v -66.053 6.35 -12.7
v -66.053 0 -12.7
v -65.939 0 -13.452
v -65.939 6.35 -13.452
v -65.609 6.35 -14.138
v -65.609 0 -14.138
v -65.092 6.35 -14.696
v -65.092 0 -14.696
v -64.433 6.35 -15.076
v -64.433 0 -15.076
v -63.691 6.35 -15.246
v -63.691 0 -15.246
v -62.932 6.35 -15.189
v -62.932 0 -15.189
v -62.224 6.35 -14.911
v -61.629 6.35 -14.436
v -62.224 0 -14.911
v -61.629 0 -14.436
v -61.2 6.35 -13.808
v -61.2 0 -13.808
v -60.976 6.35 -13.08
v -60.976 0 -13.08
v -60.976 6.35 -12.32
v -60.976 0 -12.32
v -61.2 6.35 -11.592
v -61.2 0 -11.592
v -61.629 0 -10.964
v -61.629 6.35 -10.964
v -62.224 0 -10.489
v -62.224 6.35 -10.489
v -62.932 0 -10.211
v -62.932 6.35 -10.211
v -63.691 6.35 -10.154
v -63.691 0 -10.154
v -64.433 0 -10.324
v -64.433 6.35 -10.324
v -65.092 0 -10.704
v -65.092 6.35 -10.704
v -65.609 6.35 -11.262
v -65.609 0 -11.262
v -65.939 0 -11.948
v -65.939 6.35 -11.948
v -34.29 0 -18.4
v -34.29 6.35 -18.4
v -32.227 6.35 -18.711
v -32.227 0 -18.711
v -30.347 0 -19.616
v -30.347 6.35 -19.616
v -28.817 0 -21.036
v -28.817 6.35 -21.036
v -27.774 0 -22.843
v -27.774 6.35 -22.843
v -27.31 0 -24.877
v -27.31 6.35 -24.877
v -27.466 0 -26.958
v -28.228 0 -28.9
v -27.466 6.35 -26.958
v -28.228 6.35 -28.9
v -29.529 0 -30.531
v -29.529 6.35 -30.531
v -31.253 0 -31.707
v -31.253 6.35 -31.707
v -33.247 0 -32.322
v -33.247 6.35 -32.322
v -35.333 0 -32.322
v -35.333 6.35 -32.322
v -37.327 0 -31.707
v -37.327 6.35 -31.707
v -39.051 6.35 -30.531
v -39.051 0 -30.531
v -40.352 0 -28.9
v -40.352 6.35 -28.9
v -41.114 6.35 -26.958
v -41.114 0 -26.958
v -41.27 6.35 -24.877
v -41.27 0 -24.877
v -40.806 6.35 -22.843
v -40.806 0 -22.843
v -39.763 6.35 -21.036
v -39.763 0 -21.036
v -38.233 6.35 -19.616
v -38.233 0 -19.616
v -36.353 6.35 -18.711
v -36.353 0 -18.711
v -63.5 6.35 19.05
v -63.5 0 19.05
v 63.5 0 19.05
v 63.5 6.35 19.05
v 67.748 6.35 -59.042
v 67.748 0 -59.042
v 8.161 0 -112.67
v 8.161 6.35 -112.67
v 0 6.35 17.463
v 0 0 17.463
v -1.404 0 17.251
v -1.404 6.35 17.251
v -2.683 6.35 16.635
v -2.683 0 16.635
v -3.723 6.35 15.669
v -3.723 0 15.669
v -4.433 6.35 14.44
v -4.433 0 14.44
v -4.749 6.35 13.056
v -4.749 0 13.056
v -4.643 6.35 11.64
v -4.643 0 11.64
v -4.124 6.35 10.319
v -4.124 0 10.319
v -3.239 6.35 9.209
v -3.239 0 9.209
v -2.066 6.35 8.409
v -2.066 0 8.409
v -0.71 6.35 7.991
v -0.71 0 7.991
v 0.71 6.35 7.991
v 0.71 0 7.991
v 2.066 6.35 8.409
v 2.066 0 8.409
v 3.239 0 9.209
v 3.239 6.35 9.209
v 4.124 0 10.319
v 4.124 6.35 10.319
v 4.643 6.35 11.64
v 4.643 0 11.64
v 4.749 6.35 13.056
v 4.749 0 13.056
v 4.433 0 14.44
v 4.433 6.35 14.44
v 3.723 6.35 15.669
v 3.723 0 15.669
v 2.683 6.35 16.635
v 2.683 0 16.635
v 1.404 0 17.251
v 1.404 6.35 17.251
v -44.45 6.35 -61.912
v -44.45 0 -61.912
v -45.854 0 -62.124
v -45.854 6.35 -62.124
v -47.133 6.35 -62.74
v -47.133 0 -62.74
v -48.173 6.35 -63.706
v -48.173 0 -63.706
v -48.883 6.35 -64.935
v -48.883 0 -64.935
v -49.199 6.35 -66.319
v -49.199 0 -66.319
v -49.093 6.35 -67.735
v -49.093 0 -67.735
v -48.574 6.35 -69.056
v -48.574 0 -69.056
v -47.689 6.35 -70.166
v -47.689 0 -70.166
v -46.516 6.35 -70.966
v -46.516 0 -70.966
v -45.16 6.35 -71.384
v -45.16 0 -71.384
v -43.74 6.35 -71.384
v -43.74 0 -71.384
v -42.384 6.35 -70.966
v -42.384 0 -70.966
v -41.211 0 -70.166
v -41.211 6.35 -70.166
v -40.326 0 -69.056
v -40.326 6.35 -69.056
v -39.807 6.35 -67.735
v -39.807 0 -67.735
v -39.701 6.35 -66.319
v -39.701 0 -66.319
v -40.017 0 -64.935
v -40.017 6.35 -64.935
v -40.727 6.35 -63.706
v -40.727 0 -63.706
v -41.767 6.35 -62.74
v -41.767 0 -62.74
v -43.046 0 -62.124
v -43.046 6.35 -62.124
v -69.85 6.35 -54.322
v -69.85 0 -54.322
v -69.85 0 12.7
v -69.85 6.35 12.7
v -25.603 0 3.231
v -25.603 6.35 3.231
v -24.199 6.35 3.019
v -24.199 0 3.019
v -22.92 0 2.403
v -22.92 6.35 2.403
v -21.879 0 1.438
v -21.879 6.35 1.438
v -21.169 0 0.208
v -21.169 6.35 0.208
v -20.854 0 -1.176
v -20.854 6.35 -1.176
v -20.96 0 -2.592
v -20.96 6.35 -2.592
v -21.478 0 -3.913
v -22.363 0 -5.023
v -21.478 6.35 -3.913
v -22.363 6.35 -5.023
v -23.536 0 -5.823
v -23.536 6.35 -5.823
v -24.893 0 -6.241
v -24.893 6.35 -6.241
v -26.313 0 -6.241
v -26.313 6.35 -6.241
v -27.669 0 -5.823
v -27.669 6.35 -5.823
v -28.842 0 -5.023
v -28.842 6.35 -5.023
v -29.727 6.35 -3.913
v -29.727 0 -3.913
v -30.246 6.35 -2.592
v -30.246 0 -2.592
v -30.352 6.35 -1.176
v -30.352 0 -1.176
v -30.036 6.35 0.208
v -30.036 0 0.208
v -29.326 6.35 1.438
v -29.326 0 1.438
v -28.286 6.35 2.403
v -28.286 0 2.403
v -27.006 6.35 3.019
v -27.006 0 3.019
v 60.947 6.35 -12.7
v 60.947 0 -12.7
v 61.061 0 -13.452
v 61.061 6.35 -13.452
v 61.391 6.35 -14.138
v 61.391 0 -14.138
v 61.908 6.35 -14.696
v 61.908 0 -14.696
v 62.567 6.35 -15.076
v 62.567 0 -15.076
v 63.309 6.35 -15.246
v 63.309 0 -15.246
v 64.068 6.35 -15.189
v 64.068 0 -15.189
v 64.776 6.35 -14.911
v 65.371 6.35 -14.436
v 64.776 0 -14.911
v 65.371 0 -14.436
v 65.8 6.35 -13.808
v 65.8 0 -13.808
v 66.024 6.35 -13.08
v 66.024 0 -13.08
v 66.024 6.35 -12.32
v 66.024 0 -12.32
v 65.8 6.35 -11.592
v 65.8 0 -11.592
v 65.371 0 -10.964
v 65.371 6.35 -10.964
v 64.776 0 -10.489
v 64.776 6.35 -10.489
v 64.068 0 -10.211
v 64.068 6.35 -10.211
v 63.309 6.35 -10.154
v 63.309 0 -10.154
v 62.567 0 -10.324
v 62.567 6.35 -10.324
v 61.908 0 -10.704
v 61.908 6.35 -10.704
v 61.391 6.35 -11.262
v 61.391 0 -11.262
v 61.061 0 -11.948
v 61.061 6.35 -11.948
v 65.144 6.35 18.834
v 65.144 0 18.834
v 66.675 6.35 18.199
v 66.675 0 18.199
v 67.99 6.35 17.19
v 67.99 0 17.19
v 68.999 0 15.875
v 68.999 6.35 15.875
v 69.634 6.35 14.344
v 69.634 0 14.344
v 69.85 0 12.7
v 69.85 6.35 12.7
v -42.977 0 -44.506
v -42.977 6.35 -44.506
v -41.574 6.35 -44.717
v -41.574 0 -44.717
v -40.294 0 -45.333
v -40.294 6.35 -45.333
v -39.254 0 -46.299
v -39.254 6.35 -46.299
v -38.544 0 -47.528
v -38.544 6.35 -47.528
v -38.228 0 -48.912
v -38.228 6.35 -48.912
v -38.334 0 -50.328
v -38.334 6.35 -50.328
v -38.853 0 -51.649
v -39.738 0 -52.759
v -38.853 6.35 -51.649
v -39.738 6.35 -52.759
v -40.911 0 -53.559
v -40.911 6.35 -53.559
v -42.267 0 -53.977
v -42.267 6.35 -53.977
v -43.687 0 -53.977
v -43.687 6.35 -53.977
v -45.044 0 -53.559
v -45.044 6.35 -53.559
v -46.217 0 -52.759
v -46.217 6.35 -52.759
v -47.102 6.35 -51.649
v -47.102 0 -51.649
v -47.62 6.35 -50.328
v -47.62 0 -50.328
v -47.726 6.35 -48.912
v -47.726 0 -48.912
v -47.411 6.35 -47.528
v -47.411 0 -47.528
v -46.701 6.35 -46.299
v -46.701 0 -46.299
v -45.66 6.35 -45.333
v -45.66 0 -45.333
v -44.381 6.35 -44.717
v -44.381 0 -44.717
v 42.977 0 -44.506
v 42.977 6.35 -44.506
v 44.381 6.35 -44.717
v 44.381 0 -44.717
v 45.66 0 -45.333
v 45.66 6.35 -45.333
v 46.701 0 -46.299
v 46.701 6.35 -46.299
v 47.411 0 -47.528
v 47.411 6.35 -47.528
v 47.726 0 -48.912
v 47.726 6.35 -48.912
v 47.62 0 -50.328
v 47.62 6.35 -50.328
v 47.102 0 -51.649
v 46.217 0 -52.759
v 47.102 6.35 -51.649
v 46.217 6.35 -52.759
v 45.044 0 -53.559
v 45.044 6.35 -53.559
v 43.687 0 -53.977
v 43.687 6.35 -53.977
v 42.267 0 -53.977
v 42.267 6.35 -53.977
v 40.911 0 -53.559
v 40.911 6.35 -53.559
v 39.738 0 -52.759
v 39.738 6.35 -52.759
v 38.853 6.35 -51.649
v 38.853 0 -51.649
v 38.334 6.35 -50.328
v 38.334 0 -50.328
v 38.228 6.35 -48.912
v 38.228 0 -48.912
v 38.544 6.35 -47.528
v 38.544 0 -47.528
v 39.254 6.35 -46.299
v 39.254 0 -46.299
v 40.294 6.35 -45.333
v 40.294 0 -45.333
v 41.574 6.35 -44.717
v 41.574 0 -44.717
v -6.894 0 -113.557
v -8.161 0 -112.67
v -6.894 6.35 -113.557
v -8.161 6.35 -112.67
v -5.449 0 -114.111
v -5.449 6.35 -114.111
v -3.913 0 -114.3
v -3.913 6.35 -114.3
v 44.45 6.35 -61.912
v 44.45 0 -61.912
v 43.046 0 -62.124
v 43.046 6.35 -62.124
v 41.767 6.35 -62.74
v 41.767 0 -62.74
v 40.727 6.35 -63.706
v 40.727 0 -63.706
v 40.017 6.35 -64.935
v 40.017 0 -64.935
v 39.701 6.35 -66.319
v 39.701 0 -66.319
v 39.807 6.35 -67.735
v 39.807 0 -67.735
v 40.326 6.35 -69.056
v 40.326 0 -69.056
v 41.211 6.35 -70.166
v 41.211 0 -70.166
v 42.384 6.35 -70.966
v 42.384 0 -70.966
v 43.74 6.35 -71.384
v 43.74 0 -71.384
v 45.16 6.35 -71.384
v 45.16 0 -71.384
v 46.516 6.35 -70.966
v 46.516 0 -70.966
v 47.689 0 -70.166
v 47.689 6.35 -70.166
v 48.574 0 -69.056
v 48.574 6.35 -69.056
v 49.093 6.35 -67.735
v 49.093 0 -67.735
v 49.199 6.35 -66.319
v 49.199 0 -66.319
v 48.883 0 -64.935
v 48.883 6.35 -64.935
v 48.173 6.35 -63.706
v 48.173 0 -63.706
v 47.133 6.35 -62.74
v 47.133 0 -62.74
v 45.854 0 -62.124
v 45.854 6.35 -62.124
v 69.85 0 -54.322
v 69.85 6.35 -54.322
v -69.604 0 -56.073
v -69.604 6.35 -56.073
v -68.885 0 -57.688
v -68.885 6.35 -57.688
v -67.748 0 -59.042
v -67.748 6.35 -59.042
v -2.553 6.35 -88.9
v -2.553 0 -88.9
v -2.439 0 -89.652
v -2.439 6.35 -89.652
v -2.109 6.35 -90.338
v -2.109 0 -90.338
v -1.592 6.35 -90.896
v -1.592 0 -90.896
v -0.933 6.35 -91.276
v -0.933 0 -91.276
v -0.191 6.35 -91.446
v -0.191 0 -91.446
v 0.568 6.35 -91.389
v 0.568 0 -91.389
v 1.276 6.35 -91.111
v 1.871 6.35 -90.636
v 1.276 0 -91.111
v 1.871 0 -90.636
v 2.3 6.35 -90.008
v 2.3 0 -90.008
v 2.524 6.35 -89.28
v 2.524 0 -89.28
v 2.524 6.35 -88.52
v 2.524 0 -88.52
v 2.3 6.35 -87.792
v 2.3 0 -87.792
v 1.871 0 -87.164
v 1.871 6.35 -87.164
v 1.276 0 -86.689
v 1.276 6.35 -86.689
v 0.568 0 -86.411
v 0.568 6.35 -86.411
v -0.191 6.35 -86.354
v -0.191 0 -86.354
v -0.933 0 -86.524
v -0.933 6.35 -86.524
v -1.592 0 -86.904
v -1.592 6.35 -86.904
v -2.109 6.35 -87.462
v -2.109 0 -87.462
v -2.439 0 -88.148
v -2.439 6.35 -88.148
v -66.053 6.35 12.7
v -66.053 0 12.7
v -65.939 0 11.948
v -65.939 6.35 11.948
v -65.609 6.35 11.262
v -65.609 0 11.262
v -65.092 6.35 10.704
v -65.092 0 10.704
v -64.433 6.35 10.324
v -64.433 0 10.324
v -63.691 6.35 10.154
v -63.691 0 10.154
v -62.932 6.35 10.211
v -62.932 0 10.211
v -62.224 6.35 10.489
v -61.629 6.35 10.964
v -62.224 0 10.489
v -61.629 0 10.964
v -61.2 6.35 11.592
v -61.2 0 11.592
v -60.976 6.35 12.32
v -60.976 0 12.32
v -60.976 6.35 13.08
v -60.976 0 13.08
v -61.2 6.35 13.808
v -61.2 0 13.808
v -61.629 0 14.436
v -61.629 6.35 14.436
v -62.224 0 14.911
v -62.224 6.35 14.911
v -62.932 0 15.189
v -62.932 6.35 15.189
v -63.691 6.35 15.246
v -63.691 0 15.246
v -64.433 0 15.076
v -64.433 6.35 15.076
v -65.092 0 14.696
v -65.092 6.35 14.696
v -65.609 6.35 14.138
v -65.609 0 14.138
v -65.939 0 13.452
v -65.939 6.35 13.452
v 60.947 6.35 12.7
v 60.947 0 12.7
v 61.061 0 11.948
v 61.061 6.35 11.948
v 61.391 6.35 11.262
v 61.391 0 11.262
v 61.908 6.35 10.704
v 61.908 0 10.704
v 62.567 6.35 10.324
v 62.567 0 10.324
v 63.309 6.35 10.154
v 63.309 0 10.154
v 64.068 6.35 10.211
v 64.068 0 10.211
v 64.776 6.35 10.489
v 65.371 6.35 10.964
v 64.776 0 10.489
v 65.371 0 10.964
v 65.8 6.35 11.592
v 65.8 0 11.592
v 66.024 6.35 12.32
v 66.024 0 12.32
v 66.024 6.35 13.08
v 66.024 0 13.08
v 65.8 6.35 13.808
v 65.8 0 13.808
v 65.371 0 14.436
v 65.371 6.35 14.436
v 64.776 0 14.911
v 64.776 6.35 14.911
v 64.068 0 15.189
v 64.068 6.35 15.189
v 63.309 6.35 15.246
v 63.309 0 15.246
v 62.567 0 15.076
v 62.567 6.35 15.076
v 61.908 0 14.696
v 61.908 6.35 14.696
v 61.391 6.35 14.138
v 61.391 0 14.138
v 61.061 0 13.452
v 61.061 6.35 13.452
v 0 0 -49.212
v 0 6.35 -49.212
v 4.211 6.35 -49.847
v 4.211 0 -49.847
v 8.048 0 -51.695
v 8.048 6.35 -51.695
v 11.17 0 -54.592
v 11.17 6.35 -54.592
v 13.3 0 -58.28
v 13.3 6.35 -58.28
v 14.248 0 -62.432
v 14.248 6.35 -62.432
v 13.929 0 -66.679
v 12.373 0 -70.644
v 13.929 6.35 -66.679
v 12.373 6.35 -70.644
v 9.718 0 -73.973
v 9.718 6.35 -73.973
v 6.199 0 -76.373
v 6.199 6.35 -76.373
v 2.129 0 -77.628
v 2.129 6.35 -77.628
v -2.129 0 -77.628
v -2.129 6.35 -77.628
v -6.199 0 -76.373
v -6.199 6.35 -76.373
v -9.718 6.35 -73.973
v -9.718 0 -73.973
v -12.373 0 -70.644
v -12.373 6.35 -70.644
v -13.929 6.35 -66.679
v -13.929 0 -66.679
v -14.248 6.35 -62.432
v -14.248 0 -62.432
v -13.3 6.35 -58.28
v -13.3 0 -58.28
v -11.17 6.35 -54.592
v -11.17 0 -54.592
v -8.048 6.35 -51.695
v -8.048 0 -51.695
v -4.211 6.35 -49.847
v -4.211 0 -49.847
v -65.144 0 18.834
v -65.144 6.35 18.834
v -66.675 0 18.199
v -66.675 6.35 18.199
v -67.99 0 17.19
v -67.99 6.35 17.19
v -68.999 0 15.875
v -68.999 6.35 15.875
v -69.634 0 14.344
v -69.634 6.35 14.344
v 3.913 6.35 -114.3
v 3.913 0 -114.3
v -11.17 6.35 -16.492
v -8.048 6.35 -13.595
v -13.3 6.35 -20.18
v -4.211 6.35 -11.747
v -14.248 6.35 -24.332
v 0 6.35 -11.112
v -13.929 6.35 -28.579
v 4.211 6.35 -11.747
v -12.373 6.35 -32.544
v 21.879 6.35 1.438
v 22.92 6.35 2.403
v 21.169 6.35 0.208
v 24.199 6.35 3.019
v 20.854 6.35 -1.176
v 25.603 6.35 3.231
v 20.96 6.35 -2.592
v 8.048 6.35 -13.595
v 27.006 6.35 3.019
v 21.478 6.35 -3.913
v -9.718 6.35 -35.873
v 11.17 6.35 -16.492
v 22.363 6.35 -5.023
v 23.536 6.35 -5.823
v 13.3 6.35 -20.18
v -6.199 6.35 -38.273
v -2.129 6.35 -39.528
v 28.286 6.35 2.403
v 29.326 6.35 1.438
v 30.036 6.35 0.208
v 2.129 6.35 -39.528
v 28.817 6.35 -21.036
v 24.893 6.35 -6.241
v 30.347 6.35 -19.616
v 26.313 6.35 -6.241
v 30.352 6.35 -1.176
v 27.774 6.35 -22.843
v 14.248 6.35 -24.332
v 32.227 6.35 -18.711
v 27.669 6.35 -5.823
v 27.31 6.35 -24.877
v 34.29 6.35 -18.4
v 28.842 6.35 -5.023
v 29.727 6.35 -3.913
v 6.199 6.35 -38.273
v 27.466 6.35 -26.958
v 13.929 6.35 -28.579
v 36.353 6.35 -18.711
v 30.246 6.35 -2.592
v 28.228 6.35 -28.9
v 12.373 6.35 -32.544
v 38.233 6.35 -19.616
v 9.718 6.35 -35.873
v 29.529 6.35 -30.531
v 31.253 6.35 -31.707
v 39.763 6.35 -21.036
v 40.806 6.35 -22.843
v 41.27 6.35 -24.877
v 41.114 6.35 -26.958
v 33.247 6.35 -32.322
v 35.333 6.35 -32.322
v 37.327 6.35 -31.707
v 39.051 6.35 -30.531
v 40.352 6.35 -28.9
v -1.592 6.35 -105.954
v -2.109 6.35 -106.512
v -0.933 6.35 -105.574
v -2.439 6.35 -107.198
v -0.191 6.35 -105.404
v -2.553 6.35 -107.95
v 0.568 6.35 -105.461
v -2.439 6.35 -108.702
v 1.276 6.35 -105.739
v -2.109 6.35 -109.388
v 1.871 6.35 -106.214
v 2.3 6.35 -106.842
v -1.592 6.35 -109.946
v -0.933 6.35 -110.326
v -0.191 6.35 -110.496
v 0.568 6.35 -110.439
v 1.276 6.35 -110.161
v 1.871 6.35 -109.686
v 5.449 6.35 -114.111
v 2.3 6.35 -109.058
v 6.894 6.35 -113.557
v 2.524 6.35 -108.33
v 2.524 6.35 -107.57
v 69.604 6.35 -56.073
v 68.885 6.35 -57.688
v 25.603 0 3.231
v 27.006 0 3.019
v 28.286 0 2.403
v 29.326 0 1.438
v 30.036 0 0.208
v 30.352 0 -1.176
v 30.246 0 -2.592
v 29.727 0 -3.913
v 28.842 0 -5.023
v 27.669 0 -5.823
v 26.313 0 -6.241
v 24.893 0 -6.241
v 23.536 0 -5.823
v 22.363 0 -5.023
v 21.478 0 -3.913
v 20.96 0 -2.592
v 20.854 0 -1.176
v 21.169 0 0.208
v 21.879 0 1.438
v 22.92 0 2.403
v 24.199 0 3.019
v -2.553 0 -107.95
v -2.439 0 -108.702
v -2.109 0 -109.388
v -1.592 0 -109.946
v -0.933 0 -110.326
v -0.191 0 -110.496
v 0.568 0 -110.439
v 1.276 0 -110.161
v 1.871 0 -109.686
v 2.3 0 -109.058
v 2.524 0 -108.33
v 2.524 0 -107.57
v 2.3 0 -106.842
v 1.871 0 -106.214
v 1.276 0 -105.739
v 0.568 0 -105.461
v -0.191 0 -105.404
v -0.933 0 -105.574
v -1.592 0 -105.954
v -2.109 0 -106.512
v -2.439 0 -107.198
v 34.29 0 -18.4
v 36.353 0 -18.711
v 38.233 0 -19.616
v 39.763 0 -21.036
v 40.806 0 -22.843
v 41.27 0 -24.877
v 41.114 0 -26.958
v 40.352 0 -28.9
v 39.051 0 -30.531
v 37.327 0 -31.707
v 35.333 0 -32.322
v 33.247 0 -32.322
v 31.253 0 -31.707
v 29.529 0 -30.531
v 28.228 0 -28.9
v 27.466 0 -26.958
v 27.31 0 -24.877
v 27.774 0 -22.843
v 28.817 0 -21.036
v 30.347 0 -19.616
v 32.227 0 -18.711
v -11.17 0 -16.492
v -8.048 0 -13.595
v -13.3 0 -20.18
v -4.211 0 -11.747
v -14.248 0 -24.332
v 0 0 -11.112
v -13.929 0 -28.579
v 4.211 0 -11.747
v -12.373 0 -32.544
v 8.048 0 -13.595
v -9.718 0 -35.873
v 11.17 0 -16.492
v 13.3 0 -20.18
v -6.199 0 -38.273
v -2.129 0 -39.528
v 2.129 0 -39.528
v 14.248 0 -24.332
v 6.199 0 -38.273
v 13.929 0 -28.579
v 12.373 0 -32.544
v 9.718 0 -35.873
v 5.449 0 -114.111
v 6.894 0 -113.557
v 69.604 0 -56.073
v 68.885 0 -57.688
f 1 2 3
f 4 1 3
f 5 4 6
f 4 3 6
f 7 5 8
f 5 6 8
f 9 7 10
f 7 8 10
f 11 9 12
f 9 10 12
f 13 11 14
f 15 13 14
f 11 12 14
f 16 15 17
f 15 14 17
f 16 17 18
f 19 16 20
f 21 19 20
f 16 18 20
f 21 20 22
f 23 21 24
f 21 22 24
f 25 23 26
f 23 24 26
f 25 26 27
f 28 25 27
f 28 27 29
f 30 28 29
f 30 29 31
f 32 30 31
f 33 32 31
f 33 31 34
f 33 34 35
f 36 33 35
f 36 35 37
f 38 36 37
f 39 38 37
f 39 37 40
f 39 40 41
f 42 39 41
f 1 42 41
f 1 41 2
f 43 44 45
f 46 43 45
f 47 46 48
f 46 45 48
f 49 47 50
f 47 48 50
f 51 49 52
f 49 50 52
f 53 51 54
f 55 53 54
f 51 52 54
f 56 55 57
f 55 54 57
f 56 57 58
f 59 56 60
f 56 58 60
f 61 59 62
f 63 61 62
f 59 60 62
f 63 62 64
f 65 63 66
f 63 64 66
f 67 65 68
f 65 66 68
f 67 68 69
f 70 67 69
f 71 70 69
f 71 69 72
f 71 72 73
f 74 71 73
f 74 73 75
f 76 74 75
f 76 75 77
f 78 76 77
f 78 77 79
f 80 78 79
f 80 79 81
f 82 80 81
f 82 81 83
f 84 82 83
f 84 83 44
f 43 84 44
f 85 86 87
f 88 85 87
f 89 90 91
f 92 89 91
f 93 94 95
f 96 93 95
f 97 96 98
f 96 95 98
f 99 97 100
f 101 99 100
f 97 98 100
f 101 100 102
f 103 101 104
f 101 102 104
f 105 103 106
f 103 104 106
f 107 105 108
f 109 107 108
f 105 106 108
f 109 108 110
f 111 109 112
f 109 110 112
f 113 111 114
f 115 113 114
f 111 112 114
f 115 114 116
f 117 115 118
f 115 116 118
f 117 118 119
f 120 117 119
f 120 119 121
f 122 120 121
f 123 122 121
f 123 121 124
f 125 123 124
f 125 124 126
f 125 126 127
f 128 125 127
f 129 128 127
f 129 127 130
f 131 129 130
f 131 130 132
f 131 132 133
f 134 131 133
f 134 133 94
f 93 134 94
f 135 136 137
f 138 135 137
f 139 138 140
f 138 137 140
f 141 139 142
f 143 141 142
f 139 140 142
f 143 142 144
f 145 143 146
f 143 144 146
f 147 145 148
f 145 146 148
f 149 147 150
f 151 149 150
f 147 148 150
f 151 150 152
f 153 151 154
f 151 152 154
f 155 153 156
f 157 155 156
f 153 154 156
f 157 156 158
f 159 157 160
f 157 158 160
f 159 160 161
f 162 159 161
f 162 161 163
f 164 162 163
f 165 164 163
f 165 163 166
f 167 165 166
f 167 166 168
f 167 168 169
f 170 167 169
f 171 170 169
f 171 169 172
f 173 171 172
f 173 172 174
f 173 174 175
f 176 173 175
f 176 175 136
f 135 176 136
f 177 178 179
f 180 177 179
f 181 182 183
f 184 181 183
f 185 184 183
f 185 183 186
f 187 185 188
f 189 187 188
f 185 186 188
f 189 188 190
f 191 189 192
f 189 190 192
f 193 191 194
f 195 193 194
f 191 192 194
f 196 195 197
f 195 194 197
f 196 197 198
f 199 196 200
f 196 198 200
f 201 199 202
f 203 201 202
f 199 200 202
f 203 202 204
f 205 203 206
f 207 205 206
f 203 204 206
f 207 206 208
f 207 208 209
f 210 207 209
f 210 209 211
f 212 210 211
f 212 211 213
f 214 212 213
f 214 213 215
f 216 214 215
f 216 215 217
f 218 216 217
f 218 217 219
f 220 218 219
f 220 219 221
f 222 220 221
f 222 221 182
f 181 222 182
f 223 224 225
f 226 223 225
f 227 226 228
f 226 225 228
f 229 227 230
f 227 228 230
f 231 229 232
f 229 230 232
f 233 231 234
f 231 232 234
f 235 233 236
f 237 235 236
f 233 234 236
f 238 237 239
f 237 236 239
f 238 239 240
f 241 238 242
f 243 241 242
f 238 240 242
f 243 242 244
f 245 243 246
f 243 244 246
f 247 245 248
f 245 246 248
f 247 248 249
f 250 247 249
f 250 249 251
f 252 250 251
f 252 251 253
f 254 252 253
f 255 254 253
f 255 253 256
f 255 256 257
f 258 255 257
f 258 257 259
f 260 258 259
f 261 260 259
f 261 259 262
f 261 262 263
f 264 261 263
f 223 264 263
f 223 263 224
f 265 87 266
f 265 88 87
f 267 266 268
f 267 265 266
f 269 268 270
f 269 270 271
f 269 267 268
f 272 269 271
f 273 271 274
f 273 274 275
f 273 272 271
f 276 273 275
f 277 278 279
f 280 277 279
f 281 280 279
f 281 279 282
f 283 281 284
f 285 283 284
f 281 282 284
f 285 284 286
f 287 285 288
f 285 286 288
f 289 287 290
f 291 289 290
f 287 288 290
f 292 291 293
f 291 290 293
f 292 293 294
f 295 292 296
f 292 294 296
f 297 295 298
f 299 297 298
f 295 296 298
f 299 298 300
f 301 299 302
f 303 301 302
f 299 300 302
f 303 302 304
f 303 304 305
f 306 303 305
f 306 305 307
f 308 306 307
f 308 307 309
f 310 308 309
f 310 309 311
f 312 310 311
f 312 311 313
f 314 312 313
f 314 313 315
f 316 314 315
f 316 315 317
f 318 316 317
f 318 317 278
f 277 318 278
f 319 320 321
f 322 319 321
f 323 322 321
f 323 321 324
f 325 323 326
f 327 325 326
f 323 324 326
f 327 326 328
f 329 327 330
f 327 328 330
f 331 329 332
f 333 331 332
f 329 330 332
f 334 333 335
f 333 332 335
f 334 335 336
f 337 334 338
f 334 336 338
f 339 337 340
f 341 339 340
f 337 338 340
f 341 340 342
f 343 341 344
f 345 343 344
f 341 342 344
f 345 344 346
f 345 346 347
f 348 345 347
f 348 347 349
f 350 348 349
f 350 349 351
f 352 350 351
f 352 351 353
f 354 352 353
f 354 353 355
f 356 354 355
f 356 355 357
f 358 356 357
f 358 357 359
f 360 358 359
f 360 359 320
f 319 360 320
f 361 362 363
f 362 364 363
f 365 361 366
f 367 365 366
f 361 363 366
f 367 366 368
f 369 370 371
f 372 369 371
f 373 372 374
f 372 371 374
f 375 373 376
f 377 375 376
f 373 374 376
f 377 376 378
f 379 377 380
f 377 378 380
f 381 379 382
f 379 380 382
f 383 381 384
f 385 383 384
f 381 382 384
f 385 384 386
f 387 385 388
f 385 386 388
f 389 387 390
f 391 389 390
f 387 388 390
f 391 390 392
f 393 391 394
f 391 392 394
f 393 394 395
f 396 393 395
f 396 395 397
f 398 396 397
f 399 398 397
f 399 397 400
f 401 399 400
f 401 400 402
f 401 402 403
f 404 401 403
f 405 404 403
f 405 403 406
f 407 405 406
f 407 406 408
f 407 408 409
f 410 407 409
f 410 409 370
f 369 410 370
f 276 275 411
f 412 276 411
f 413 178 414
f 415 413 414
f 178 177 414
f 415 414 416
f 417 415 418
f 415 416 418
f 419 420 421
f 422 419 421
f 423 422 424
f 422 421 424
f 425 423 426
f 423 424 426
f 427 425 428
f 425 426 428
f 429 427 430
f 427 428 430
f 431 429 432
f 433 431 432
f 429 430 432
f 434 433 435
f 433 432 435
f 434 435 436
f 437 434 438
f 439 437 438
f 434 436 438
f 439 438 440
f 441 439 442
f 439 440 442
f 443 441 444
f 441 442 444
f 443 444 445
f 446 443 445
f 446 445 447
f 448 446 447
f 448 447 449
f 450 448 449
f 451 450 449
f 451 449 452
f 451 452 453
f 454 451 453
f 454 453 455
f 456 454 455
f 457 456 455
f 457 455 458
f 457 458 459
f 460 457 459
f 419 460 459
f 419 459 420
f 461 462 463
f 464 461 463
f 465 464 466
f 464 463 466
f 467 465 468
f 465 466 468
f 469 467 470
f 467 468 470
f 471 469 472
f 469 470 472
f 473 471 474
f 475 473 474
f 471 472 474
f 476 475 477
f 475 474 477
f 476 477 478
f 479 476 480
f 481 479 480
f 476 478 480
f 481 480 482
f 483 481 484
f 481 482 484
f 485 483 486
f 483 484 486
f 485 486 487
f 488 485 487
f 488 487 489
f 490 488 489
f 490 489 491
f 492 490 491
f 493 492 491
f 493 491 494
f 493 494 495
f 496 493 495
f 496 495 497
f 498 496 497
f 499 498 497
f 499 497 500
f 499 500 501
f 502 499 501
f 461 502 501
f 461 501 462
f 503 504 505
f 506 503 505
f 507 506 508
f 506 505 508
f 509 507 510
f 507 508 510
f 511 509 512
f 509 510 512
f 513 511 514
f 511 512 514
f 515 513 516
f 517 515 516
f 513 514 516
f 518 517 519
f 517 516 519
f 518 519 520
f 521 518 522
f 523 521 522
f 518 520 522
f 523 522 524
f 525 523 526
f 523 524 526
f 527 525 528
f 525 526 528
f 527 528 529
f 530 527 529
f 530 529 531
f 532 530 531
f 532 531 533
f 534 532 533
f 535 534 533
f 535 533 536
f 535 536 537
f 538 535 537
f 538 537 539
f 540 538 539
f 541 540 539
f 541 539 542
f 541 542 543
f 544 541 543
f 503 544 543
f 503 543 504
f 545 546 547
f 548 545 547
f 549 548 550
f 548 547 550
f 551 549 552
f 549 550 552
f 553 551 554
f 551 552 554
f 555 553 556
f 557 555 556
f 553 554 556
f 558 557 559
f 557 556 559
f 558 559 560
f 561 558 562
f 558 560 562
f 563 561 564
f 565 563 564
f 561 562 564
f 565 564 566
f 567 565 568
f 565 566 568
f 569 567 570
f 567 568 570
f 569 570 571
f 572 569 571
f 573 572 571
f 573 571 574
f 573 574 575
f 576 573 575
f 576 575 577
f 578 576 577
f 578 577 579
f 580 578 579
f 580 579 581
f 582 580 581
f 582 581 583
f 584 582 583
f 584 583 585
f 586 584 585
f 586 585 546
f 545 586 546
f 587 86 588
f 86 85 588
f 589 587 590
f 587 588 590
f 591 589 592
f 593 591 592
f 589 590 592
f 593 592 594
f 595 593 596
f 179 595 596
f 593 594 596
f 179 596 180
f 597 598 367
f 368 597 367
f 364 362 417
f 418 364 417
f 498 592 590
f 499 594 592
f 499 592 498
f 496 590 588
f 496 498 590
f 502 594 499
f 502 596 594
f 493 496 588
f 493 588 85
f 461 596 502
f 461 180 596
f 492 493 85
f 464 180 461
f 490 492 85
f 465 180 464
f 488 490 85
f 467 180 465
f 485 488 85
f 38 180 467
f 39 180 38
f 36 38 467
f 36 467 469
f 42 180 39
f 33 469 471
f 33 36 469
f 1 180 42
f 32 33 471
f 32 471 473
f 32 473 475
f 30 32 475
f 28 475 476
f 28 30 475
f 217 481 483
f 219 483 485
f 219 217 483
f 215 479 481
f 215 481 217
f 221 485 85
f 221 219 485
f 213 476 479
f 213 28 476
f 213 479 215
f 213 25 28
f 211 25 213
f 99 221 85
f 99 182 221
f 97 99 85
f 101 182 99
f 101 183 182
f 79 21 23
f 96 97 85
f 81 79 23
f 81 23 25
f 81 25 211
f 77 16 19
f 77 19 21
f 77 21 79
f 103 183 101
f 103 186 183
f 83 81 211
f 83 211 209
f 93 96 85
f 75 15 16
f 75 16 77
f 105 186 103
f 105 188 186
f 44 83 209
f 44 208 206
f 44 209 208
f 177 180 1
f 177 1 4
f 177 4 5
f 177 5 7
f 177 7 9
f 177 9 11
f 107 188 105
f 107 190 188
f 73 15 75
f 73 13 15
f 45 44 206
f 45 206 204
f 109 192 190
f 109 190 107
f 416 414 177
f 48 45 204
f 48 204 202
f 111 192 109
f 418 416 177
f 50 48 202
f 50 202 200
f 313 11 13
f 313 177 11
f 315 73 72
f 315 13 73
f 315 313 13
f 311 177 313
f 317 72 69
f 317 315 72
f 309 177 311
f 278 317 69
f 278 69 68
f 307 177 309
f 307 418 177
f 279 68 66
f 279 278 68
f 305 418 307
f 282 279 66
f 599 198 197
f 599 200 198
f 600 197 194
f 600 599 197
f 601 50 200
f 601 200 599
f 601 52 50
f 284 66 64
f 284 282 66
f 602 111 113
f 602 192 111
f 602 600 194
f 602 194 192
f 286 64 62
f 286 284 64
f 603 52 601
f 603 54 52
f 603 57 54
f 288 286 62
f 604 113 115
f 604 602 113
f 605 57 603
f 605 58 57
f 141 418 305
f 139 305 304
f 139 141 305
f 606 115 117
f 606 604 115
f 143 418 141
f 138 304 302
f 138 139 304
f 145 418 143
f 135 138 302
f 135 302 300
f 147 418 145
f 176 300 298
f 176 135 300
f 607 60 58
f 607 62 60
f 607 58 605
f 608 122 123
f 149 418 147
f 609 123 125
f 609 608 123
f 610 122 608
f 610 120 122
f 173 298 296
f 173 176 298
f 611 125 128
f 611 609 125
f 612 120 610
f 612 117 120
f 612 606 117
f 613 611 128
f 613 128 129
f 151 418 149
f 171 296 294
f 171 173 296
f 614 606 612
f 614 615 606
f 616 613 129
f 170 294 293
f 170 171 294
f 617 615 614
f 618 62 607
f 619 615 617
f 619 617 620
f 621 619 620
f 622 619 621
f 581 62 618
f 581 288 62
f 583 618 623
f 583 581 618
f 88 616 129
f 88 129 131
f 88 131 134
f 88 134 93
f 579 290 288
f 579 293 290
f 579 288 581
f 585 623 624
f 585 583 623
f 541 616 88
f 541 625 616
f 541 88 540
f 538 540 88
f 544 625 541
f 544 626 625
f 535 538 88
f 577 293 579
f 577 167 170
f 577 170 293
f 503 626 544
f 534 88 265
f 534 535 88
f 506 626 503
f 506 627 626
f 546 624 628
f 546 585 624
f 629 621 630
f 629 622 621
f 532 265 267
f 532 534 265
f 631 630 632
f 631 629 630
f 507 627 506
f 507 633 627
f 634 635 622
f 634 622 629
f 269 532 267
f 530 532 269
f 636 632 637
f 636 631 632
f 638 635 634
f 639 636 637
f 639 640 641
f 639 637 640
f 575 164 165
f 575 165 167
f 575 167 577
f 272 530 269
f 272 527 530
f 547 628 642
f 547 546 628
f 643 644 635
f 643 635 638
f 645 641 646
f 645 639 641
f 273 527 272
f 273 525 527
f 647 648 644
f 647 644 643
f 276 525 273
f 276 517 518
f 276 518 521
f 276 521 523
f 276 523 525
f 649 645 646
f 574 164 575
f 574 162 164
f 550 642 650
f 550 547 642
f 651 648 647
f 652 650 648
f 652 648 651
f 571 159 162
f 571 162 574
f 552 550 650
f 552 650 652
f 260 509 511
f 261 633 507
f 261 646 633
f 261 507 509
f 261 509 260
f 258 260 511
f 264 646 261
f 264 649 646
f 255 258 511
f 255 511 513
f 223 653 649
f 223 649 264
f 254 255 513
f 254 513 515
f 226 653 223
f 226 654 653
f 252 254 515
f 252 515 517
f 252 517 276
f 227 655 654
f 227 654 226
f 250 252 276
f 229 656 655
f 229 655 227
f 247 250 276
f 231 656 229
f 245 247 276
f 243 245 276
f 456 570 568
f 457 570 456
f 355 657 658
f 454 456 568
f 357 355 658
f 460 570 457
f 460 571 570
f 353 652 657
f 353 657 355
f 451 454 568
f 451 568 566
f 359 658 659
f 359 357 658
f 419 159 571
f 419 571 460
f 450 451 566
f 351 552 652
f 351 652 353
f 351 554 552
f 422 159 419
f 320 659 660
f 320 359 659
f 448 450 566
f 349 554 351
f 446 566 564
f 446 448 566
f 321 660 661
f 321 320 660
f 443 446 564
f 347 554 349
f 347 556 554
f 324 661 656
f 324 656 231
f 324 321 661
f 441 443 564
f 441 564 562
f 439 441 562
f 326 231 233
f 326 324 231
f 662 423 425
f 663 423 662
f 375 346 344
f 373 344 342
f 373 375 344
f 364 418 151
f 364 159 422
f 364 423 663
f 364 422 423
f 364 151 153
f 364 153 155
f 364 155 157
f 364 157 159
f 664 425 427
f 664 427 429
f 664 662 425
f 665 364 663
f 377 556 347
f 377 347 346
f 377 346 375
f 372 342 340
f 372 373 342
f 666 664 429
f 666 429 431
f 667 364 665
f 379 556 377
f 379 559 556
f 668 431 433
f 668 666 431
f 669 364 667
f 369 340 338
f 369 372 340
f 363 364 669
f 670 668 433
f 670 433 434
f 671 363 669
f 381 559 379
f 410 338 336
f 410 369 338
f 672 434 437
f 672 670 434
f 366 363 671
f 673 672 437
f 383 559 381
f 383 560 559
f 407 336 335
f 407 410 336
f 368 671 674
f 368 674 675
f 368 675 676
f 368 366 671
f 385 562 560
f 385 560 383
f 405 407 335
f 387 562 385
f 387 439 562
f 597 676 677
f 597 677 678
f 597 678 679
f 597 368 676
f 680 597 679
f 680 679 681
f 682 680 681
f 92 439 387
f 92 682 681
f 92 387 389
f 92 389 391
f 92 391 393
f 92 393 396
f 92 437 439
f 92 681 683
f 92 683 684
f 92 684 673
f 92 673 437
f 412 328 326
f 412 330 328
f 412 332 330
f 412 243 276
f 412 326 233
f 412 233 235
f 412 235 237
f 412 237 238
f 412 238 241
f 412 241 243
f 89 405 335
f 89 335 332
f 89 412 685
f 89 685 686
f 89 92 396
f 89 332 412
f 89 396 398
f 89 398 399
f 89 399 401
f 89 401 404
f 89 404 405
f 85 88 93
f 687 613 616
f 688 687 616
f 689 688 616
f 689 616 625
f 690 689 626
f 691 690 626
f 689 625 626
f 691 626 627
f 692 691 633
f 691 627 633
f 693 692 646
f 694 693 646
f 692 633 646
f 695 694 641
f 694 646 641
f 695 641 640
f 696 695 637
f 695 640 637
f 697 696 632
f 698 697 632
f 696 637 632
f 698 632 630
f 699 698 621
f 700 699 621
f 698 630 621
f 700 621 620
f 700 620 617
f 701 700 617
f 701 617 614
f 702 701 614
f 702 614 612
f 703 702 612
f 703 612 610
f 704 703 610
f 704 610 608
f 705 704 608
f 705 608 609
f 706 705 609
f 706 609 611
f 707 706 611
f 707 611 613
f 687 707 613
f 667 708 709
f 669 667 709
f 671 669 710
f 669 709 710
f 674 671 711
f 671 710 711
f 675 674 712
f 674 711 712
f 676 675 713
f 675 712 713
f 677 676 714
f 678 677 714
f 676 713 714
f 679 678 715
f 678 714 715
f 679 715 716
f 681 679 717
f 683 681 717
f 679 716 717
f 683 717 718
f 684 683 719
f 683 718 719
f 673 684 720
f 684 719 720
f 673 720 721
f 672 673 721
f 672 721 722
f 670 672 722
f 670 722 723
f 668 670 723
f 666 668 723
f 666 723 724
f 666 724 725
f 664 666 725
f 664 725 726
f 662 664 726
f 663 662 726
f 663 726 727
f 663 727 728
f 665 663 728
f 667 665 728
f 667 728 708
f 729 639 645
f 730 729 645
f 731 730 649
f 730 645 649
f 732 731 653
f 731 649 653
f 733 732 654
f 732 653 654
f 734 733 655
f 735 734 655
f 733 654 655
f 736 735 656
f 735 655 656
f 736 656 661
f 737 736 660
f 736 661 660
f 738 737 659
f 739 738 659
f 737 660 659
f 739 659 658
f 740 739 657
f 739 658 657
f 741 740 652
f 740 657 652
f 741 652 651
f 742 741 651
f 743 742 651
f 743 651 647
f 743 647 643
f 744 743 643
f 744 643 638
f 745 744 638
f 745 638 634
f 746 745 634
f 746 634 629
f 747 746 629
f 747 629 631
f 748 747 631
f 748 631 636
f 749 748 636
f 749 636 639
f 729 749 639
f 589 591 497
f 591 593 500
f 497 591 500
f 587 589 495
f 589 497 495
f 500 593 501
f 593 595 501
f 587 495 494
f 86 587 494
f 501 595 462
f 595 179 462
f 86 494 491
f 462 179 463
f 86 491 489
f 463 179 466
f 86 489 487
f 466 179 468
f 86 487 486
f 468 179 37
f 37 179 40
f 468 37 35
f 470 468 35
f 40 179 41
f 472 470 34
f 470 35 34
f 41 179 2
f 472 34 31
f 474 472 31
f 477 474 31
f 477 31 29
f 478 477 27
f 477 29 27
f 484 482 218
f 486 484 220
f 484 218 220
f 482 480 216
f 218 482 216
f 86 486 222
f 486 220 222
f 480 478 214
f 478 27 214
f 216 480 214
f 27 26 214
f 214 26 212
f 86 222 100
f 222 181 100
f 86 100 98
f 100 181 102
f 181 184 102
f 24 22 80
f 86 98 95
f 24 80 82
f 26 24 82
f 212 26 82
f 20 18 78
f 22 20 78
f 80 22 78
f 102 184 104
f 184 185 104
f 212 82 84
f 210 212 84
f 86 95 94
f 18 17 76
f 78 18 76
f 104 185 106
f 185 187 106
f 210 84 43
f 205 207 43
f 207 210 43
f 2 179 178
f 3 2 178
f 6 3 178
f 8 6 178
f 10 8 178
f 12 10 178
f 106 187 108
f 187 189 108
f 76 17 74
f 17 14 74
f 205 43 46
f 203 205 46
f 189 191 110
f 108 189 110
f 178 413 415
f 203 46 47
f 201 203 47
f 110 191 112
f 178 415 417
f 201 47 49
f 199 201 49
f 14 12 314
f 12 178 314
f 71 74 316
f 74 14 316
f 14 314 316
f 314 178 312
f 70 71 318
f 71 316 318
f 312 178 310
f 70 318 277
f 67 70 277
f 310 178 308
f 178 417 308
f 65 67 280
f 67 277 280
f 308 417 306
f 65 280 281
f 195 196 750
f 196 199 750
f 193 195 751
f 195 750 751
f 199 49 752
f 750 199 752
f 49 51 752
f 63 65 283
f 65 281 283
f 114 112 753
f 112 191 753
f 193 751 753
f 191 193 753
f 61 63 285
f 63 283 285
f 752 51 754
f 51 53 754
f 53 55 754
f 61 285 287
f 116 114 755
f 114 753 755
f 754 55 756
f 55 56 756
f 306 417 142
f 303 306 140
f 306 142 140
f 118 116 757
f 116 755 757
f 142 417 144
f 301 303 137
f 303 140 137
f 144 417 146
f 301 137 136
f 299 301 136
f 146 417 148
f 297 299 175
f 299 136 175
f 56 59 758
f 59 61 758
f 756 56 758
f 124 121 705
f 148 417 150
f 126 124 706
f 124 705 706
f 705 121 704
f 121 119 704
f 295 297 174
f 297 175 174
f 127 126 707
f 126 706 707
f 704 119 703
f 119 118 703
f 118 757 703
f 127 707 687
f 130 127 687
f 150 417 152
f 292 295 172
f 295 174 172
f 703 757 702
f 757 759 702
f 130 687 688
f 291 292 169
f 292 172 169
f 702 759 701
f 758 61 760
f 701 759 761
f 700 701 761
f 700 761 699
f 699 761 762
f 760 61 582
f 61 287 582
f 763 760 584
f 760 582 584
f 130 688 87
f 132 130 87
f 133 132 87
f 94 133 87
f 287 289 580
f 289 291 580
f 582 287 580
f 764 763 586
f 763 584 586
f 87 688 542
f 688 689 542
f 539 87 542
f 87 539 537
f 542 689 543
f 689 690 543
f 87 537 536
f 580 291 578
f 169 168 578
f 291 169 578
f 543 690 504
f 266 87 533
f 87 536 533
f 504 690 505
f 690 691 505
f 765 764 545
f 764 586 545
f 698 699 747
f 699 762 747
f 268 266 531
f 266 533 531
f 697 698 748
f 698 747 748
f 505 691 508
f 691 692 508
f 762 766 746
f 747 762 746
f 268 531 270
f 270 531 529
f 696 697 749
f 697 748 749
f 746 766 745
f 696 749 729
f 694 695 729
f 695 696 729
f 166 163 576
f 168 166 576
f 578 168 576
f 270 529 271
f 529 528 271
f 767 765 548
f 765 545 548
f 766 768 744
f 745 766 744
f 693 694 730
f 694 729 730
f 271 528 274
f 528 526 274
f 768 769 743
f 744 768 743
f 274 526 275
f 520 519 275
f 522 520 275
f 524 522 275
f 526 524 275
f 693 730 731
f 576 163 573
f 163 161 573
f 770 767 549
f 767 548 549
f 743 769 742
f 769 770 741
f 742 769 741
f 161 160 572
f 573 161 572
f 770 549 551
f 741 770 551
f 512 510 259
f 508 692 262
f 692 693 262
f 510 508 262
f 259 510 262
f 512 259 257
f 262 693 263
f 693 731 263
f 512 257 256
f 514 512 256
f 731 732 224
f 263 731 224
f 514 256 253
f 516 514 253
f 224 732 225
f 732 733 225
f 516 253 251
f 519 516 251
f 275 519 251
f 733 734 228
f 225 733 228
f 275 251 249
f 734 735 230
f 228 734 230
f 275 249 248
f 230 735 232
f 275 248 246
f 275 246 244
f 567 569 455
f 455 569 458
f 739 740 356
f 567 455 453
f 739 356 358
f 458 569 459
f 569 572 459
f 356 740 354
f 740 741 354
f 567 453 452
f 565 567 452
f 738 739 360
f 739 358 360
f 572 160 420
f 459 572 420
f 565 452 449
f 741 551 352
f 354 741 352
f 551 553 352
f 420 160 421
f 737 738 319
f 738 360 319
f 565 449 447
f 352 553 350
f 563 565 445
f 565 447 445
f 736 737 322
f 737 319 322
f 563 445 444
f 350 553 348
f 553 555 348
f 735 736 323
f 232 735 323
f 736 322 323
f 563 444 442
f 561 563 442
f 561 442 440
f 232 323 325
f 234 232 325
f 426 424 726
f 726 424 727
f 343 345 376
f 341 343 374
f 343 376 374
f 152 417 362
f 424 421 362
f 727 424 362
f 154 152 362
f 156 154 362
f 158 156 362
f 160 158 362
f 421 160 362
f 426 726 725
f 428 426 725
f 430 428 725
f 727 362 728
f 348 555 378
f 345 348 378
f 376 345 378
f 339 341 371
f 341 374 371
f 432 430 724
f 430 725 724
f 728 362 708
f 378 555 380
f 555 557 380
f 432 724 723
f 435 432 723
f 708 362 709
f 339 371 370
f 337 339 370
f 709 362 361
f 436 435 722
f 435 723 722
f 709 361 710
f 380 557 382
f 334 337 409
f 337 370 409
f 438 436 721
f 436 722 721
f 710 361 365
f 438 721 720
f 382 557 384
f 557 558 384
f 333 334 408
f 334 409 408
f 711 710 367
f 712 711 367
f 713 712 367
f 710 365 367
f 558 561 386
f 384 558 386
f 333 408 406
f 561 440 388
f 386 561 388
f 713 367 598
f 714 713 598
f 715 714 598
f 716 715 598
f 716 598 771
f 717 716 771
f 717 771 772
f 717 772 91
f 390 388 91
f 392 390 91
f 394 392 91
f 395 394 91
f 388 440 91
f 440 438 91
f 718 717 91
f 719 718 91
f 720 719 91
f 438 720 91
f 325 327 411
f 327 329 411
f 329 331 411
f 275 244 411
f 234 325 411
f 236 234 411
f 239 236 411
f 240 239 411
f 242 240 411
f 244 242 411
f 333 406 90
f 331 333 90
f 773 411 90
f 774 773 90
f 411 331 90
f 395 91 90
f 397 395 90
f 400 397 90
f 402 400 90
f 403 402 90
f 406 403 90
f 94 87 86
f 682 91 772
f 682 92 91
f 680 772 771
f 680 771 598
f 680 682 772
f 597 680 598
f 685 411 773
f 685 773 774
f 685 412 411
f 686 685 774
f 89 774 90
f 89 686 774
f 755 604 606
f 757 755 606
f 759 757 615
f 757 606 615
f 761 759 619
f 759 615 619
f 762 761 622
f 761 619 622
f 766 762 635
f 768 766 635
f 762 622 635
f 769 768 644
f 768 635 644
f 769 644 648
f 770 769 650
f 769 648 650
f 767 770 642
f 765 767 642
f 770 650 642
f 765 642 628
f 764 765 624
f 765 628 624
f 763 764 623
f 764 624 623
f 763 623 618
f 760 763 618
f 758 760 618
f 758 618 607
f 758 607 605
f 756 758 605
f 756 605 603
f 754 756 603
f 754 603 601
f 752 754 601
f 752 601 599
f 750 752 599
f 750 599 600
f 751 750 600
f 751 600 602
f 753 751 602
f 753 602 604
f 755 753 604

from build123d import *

# Parameters (mm, degrees)
BOSS_EXTRUDE1_DEPTH        = 6.35
SKETCH2_R                  = 7
MOTOR_BEARING_HOLES_DEPTH  = 135.10382172
SKETCH3_R                  = 14.2875
CUT_EXTRUDE1_DEPTH         = 135.10382172
SKETCH4_R                  = 14.2875
CUT_EXTRUDE2_DEPTH         = 135.10382172
SKETCH5_R                  = 4.7625
CUT_EXTRUDE3_DEPTH         = 50.8
F_10_CLEARANCE_HOLE1_D     = 5.1054
F_10_CLEARANCE_HOLE2_D     = 5.1054
F_10_CLEARANCE_HOLE2_DEPTH = 50.8
F_10_CLEARANCE_HOLE2_TIP   = 1.533816902
FILLET1_R                  = 6.35
SKETCH10_R                 = 4.7625
CUT_EXTRUDE4_DEPTH         = 50.8


with BuildPart() as part:
    # Sketch1 → Boss-Extrude1 (new body)
    with BuildSketch(Plane(origin=(0, 0, 0), x_dir=(1, 0, 0), z_dir=(0, 1, 0))):
        Polygon((-69.85, -19.05), (69.85, -19.05), (69.85, 57.15), (6.35, 114.3), (-6.35, 114.3), (-69.85, 57.15), align=None)
    extrude(amount=BOSS_EXTRUDE1_DEPTH)

    # Sketch2 → Motor Bearing Holes (cut, through all)
    with BuildSketch(Plane(origin=(0, 6.35, 0), x_dir=(1, 0, 0), z_dir=(0, 1, 0))):
        with Locations(Location((-34.29, 25.4, 0), (0, 0, 270))):
            Circle(SKETCH2_R)
        with Locations(Location((34.29, 25.4, 0), (0, 0, 270))):
            Circle(SKETCH2_R)
    extrude(amount=-MOTOR_BEARING_HOLES_DEPTH, mode=Mode.SUBTRACT)

    # Sketch3 → Cut-Extrude1 (cut, through all)
    with BuildSketch(Plane(origin=(0, 6.35, 0), x_dir=(1, 0, 0), z_dir=(0, 1, 0))):
        with Locations(Location((0, 25.4, 0), (0, 0, 270))):
            Circle(SKETCH3_R)
    extrude(amount=-CUT_EXTRUDE1_DEPTH, mode=Mode.SUBTRACT)

    # Sketch4 → Cut-Extrude2 (cut, through all)
    with BuildSketch(Plane(origin=(0, 6.35, 0), x_dir=(1, 0, 0), z_dir=(0, 1, 0))):
        with Locations(Location((0, 63.5, 0), (0, 0, 270))):
            Circle(SKETCH4_R)
    extrude(amount=-CUT_EXTRUDE2_DEPTH, mode=Mode.SUBTRACT)

    # Sketch5 → Cut-Extrude3 (cut)
    with BuildSketch(Plane(origin=(0, 38.1, 19.05), x_dir=(-0.9584281674521108, 0, 0.2853339233851958), z_dir=(0, 1, 0))):
        with Locations(Location((21.697168114, -77.740965053, 0), (0, 0, 73.42119018))):
            Circle(SKETCH5_R)
        with Locations(Location((18.665649821, -27.031499499, 0), (0, 0, 73.42119018))):
            Circle(SKETCH5_R)
        with Locations(Location((-30.411025551, -12.420868461, 0), (0, 0, 73.42119018))):
            Circle(SKETCH5_R)
        with Locations(Location((-60.684163962, -53.21519516, 0), (0, 0, 73.42119018))):
            Circle(SKETCH5_R)
    extrude(amount=-CUT_EXTRUDE3_DEPTH, mode=Mode.SUBTRACT)

    # #10 Clearance Hole1 (through all)
    with Locations(Plane(origin=(0, 6.35, 19.05), x_dir=(1, 0, 0), z_dir=(0, 1, 0))):
        with Locations((-63.5, 6.35), (63.5, 6.35), (0, 107.95)):
            Hole(F_10_CLEARANCE_HOLE1_D / 2)

    # #10 Clearance Hole2
    with Locations(Plane(origin=(0, 38.1, 19.05), x_dir=(1, 0, 0), z_dir=(0, 1, 0))):
        with Locations((-63.5, 31.75), (63.5, 31.75), (0, 127)):
            Hole(F_10_CLEARANCE_HOLE2_D / 2, depth=F_10_CLEARANCE_HOLE2_DEPTH)
            with Locations((0, 0, -(F_10_CLEARANCE_HOLE2_DEPTH + F_10_CLEARANCE_HOLE2_TIP / 2))):  # 118° drill point
                Cone(0, F_10_CLEARANCE_HOLE2_D / 2, F_10_CLEARANCE_HOLE2_TIP, mode=Mode.SUBTRACT)

    # Fillet1
    fillet1_edges = [part.edges().sort_by_distance(p)[0] for p in [
        (-69.85, 3.175, -57.15),
        (-6.35, 3.175, -114.3),
        (6.35, 3.175, -114.3),
        (69.85, 3.175, -57.15),
        (69.85, 3.175, 19.05),
        (-69.85, 3.175, 19.05),
    ]]
    fillet(fillet1_edges, radius=FILLET1_R)

    # Sketch10 → Cut-Extrude4 (cut)
    with BuildSketch(Plane(origin=(0, -28.575, 19.05), x_dir=(-1, 0, 0), z_dir=(0, -1, 0))):
        with Locations(Location((-44.45, 85.725, 0), (0, 0, 270))):
            Circle(SKETCH10_R)
        with Locations(Location((44.45, 85.725, 0), (0, 0, 270))):
            Circle(SKETCH10_R)
        with Locations(Location((0, 6.35, 0), (0, 0, 270))):
            Circle(SKETCH10_R)
    extrude(amount=-CUT_EXTRUDE4_DEPTH, mode=Mode.SUBTRACT)


solid = part.part
